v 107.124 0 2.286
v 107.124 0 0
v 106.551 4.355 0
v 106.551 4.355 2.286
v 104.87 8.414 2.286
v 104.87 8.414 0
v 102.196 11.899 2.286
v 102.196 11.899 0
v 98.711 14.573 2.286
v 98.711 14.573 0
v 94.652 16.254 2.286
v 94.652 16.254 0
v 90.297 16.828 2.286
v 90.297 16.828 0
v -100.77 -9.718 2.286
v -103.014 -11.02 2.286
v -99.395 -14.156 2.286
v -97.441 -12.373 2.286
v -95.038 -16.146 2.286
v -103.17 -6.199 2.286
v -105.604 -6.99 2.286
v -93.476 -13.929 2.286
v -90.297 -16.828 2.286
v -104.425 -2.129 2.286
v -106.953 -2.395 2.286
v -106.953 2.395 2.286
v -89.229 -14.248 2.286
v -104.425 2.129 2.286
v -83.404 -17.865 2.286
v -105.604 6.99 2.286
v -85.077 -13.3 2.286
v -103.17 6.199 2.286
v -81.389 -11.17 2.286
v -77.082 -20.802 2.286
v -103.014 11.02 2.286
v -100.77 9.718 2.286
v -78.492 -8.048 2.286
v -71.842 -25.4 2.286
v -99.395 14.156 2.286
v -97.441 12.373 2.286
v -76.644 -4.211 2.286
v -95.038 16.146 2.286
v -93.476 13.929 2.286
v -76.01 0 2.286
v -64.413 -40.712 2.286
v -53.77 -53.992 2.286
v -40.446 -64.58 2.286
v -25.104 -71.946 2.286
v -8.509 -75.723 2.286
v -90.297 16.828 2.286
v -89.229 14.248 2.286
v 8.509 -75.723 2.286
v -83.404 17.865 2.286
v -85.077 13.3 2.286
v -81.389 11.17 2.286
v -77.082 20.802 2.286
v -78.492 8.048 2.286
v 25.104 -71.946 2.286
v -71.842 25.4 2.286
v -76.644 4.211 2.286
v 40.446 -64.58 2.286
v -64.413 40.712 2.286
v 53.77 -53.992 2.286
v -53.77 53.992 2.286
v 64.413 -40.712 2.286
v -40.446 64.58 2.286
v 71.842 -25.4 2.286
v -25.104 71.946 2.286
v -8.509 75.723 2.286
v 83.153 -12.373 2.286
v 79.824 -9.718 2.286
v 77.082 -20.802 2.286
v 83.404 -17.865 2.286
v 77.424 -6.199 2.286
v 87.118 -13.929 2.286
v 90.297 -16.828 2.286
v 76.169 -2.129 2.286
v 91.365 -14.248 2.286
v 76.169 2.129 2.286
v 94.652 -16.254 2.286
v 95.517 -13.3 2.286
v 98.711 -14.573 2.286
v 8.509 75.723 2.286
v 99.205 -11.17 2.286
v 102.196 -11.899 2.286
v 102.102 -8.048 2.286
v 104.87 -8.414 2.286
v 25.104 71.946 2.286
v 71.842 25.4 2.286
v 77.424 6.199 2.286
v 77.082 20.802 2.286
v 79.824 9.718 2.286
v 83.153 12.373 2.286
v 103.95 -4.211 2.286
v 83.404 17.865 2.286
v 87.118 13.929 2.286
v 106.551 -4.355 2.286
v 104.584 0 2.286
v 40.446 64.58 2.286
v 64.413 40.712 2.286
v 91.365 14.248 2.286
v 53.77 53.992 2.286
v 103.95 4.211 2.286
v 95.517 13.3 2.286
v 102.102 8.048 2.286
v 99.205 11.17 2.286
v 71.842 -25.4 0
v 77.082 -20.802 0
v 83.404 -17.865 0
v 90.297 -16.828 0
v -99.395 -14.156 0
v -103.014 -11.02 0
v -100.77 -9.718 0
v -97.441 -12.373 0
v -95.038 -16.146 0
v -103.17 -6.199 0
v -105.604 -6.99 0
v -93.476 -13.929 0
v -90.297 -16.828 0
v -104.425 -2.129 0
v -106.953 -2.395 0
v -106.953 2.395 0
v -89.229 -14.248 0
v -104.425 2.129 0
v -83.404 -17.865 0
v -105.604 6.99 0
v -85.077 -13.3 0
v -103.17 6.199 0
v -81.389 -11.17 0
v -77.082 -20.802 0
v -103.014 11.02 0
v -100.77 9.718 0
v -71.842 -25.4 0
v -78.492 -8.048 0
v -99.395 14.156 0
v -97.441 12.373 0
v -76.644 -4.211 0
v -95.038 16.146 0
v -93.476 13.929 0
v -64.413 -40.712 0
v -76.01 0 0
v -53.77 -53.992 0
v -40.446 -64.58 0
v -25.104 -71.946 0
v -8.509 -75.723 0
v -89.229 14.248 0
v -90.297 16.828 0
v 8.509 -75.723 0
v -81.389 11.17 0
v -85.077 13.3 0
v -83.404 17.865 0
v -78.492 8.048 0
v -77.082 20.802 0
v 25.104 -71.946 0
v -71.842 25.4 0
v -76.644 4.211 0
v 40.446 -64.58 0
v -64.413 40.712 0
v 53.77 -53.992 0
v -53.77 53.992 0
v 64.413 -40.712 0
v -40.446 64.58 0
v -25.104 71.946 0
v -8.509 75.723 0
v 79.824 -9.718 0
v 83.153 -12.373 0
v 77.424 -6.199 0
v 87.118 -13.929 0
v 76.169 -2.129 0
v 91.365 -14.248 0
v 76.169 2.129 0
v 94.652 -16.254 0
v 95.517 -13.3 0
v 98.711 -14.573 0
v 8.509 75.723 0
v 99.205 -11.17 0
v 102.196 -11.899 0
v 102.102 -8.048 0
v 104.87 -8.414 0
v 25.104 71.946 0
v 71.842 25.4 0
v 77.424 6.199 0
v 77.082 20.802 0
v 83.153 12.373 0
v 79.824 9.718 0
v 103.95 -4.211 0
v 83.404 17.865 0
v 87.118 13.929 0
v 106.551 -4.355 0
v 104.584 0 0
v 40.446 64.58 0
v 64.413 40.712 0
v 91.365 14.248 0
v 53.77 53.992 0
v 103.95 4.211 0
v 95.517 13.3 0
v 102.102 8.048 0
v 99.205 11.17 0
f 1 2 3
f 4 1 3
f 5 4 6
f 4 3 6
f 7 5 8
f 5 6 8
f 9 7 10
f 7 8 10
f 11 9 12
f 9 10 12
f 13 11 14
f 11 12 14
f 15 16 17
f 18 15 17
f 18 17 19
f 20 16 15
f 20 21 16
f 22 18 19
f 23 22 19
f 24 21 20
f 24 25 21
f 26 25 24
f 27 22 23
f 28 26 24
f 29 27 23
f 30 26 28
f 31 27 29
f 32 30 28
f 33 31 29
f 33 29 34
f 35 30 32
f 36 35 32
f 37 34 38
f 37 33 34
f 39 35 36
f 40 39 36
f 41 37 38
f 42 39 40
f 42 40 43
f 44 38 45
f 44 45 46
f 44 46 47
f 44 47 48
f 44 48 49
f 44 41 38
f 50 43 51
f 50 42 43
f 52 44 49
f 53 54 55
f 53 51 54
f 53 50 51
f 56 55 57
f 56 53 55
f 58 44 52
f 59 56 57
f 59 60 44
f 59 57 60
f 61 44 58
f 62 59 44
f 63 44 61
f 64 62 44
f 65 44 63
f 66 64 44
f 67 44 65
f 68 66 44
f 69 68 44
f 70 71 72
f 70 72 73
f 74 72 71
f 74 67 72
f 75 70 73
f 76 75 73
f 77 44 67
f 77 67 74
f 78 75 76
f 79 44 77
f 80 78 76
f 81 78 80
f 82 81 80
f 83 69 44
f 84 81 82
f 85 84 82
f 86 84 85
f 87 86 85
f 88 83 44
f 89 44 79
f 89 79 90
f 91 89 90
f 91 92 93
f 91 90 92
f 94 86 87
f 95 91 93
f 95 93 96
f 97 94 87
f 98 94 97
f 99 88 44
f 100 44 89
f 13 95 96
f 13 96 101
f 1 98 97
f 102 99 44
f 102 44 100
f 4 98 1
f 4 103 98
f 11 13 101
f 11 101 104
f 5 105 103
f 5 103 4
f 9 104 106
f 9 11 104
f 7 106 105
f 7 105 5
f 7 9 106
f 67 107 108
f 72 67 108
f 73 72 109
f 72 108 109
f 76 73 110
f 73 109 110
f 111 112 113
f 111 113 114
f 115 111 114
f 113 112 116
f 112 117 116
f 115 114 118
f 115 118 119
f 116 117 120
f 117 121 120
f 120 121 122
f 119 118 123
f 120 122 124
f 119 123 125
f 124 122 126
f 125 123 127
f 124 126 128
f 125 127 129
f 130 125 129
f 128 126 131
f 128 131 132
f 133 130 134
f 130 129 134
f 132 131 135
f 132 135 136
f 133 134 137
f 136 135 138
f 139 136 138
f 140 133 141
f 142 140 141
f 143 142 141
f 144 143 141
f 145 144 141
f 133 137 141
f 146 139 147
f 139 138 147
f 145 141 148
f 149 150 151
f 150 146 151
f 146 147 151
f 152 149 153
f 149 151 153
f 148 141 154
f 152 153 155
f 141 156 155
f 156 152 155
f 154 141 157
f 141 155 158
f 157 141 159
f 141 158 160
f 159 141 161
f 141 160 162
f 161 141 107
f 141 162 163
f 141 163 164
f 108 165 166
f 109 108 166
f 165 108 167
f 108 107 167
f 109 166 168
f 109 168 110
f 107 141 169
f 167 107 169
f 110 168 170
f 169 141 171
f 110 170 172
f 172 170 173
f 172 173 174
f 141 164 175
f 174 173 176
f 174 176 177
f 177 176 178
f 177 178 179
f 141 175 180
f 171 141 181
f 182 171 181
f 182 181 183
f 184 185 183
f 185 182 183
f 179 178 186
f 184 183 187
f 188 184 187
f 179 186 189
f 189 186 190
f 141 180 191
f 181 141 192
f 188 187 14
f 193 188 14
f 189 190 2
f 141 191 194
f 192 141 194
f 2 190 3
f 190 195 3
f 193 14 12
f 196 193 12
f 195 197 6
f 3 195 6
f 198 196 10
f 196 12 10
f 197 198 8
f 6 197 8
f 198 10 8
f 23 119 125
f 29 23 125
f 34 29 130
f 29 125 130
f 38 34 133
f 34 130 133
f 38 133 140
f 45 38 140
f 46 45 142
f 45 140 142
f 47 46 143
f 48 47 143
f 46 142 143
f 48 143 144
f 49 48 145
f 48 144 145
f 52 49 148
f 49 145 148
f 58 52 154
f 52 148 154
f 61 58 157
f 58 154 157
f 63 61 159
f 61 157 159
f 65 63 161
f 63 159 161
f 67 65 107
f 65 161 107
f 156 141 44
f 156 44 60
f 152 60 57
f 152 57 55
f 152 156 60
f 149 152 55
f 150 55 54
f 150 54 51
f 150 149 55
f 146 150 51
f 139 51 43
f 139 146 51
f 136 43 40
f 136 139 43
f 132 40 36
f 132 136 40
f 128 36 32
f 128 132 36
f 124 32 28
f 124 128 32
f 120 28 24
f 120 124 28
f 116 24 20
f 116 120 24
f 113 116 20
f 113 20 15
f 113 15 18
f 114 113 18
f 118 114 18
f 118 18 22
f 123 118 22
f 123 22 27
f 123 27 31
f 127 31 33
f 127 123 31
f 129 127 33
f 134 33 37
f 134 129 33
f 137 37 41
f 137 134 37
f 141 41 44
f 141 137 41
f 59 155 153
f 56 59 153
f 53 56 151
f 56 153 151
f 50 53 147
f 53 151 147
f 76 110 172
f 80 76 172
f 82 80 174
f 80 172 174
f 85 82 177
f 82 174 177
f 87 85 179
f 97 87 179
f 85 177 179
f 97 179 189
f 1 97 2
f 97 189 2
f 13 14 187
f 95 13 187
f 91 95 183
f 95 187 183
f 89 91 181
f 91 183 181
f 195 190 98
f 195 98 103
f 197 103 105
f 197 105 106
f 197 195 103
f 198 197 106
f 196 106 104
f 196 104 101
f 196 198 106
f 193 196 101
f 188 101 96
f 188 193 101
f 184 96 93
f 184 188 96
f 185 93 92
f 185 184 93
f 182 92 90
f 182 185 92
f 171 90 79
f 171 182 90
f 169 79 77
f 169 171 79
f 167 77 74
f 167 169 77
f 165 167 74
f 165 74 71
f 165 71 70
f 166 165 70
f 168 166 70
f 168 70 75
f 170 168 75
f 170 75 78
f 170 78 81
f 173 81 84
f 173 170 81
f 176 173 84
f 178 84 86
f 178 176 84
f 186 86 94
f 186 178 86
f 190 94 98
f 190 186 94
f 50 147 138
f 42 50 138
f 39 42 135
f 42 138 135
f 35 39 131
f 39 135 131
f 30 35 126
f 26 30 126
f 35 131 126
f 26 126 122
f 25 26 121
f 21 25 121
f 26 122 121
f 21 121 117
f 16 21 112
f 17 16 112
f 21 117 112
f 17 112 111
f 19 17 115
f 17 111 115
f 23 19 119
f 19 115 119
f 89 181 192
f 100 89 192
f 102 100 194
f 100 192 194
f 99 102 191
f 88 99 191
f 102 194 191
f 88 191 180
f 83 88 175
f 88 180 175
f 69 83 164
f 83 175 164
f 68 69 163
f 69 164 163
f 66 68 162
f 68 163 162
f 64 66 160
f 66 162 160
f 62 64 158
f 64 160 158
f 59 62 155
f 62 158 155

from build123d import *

# Parameters (mm, degrees)
F0_R     = 14.2875
F1_DEPTH = 2.286


with BuildPart() as f1:
    # F0 (on Top) → F1 (new body)
    with BuildSketch(Plane.XY):
        with BuildLine():
            ThreePointArc((-65.750812, -11.062835), (-64.101181, -18.346503), (-61.647349, -25.4))
            ThreePointArc((-61.647349, -25.4), (0, -66.675), (61.647349, -25.4))
            ThreePointArc((61.647349, -25.4), (64.101181, -18.346503), (65.750812, -11.062835))
            ThreePointArc((65.750812, -11.062835), (68.947885, -16.404785), (73.286413, -20.869634))
            ThreePointArc((73.286413, -20.869634), (74.768645, -14.69999), (75.732435, -8.428417))
            ThreePointArc((75.732435, -8.428417), (73.4695, 0), (75.732435, 8.428417))
            ThreePointArc((75.732435, 8.428417), (74.768645, 14.69999), (73.286413, 20.869634))
            ThreePointArc((73.286413, 20.869634), (68.947885, 16.404785), (65.750812, 11.062835))
            ThreePointArc((65.750812, 11.062835), (64.101181, 18.346503), (61.647349, 25.4))
            ThreePointArc((61.647349, 25.4), (0, 66.675), (-61.647349, 25.4))
            ThreePointArc((-61.647349, 25.4), (-64.101181, 18.346503), (-65.750812, 11.062835))
            ThreePointArc((-65.750812, 11.062835), (-66.675, 0), (-65.750812, -11.062835))
        make_face()
        with BuildLine():
            ThreePointArc((-90.297, -16.8275), (-81.890587, -14.577276), (-75.732435, -8.428417))
            ThreePointArc((-75.732435, -8.428417), (-74.045078, -4.363459), (-73.4695, 0))
            ThreePointArc((-73.4695, 0), (-74.045078, 4.363459), (-75.732435, 8.428417))
            ThreePointArc((-75.732435, 8.428417), (-81.890587, 14.577276), (-90.297, 16.8275))
            ThreePointArc((-90.297, 16.8275), (-107.1245, 0), (-90.297, -16.8275))
        make_face()
        with Locations((-90.297, 0)):
            Circle(F0_R, mode=Mode.SUBTRACT)
        with BuildLine():
            ThreePointArc((-75.732435, 8.428417), (-74.768645, 14.69999), (-73.286413, 20.869634))
            ThreePointArc((-73.286413, 20.869634), (-72.599578, 23.146086), (-71.842049, 25.4))
            ThreePointArc((-71.842049, 25.4), (-80.137688, 19.107685), (-90.297, 16.8275))
            ThreePointArc((-90.297, 16.8275), (-81.890587, 14.577276), (-75.732435, 8.428417))
        make_face()
        with BuildLine():
            ThreePointArc((-71.842049, -25.4), (-72.599578, -23.146086), (-73.286413, -20.869634))
            ThreePointArc((-73.286413, -20.869634), (-74.768645, -14.69999), (-75.732435, -8.428417))
            ThreePointArc((-75.732435, -8.428417), (-81.890587, -14.577276), (-90.297, -16.8275))
            ThreePointArc((-90.297, -16.8275), (-80.137688, -19.107685), (-71.842049, -25.4))
        make_face()
        with BuildLine():
            ThreePointArc((-73.286413, -20.869634), (-68.947885, -16.404785), (-65.750812, -11.062835))
            ThreePointArc((-65.750812, -11.062835), (-66.675, 0), (-65.750812, 11.062835))
            ThreePointArc((-65.750812, 11.062835), (-68.947885, 16.404785), (-73.286413, 20.869634))
            ThreePointArc((-73.286413, 20.869634), (-74.768645, 14.69999), (-75.732435, 8.428417))
            ThreePointArc((-75.732435, 8.428417), (-74.045078, 4.363459), (-73.4695, 0))
            ThreePointArc((-73.4695, 0), (-74.045078, -4.363459), (-75.732435, -8.428417))
            ThreePointArc((-75.732435, -8.428417), (-74.768645, -14.69999), (-73.286413, -20.869634))
        make_face()
        with BuildLine():
            ThreePointArc((-73.286413, 20.869634), (-68.947885, 16.404785), (-65.750812, 11.062835))
            ThreePointArc((-65.750812, 11.062835), (-64.101181, 18.346503), (-61.647349, 25.4))
            ThreePointArc((-61.647349, 25.4), (0, 66.675), (61.647349, 25.4))
            ThreePointArc((61.647349, 25.4), (64.101181, 18.346503), (65.750812, 11.062835))
            ThreePointArc((65.750812, 11.062835), (68.947885, 16.404785), (73.286413, 20.869634))
            ThreePointArc((73.286413, 20.869634), (72.599578, 23.146086), (71.842049, 25.4))
            ThreePointArc((71.842049, 25.4), (0, 76.2), (-71.842049, 25.4))
            ThreePointArc((-71.842049, 25.4), (-72.599578, 23.146086), (-73.286413, 20.869634))
        make_face()
        with BuildLine():
            ThreePointArc((61.647349, -25.4), (0, -66.675), (-61.647349, -25.4))
            ThreePointArc((-61.647349, -25.4), (-64.101181, -18.346503), (-65.750812, -11.062835))
            ThreePointArc((-65.750812, -11.062835), (-68.947885, -16.404785), (-73.286413, -20.869634))
            ThreePointArc((-73.286413, -20.869634), (-72.599578, -23.146086), (-71.842049, -25.4))
            ThreePointArc((-71.842049, -25.4), (0, -76.2), (71.842049, -25.4))
            ThreePointArc((71.842049, -25.4), (72.599578, -23.146086), (73.286413, -20.869634))
            ThreePointArc((73.286413, -20.869634), (68.947885, -16.404785), (65.750812, -11.062835))
            ThreePointArc((65.750812, -11.062835), (64.101181, -18.346503), (61.647349, -25.4))
        make_face()
        with BuildLine():
            ThreePointArc((73.286413, 20.869634), (74.768645, 14.69999), (75.732435, 8.428417))
            ThreePointArc((75.732435, 8.428417), (81.890587, 14.577276), (90.297, 16.8275))
            ThreePointArc((90.297, 16.8275), (80.137688, 19.107685), (71.842049, 25.4))
            ThreePointArc((71.842049, 25.4), (72.599578, 23.146086), (73.286413, 20.869634))
        make_face()
        with BuildLine():
            ThreePointArc((75.732435, -8.428417), (74.768645, -14.69999), (73.286413, -20.869634))
            ThreePointArc((73.286413, -20.869634), (72.599578, -23.146086), (71.842049, -25.4))
            ThreePointArc((71.842049, -25.4), (80.137688, -19.107685), (90.297, -16.8275))
            ThreePointArc((90.297, -16.8275), (81.890587, -14.577276), (75.732435, -8.428417))
        make_face()
        with BuildLine():
            ThreePointArc((75.732435, 8.428417), (73.4695, 0), (75.732435, -8.428417))
            ThreePointArc((75.732435, -8.428417), (81.890587, -14.577276), (90.297, -16.8275))
            ThreePointArc((90.297, -16.8275), (102.195839, -11.898839), (107.1245, 0))
            ThreePointArc((107.1245, 0), (102.195839, 11.898839), (90.297, 16.8275))
            ThreePointArc((90.297, 16.8275), (81.890587, 14.577276), (75.732435, 8.428417))
        make_face()
        with Locations((90.297, 0)):
            Circle(F0_R, mode=Mode.SUBTRACT)
    extrude(amount=F1_DEPTH)


solid = f1.part
